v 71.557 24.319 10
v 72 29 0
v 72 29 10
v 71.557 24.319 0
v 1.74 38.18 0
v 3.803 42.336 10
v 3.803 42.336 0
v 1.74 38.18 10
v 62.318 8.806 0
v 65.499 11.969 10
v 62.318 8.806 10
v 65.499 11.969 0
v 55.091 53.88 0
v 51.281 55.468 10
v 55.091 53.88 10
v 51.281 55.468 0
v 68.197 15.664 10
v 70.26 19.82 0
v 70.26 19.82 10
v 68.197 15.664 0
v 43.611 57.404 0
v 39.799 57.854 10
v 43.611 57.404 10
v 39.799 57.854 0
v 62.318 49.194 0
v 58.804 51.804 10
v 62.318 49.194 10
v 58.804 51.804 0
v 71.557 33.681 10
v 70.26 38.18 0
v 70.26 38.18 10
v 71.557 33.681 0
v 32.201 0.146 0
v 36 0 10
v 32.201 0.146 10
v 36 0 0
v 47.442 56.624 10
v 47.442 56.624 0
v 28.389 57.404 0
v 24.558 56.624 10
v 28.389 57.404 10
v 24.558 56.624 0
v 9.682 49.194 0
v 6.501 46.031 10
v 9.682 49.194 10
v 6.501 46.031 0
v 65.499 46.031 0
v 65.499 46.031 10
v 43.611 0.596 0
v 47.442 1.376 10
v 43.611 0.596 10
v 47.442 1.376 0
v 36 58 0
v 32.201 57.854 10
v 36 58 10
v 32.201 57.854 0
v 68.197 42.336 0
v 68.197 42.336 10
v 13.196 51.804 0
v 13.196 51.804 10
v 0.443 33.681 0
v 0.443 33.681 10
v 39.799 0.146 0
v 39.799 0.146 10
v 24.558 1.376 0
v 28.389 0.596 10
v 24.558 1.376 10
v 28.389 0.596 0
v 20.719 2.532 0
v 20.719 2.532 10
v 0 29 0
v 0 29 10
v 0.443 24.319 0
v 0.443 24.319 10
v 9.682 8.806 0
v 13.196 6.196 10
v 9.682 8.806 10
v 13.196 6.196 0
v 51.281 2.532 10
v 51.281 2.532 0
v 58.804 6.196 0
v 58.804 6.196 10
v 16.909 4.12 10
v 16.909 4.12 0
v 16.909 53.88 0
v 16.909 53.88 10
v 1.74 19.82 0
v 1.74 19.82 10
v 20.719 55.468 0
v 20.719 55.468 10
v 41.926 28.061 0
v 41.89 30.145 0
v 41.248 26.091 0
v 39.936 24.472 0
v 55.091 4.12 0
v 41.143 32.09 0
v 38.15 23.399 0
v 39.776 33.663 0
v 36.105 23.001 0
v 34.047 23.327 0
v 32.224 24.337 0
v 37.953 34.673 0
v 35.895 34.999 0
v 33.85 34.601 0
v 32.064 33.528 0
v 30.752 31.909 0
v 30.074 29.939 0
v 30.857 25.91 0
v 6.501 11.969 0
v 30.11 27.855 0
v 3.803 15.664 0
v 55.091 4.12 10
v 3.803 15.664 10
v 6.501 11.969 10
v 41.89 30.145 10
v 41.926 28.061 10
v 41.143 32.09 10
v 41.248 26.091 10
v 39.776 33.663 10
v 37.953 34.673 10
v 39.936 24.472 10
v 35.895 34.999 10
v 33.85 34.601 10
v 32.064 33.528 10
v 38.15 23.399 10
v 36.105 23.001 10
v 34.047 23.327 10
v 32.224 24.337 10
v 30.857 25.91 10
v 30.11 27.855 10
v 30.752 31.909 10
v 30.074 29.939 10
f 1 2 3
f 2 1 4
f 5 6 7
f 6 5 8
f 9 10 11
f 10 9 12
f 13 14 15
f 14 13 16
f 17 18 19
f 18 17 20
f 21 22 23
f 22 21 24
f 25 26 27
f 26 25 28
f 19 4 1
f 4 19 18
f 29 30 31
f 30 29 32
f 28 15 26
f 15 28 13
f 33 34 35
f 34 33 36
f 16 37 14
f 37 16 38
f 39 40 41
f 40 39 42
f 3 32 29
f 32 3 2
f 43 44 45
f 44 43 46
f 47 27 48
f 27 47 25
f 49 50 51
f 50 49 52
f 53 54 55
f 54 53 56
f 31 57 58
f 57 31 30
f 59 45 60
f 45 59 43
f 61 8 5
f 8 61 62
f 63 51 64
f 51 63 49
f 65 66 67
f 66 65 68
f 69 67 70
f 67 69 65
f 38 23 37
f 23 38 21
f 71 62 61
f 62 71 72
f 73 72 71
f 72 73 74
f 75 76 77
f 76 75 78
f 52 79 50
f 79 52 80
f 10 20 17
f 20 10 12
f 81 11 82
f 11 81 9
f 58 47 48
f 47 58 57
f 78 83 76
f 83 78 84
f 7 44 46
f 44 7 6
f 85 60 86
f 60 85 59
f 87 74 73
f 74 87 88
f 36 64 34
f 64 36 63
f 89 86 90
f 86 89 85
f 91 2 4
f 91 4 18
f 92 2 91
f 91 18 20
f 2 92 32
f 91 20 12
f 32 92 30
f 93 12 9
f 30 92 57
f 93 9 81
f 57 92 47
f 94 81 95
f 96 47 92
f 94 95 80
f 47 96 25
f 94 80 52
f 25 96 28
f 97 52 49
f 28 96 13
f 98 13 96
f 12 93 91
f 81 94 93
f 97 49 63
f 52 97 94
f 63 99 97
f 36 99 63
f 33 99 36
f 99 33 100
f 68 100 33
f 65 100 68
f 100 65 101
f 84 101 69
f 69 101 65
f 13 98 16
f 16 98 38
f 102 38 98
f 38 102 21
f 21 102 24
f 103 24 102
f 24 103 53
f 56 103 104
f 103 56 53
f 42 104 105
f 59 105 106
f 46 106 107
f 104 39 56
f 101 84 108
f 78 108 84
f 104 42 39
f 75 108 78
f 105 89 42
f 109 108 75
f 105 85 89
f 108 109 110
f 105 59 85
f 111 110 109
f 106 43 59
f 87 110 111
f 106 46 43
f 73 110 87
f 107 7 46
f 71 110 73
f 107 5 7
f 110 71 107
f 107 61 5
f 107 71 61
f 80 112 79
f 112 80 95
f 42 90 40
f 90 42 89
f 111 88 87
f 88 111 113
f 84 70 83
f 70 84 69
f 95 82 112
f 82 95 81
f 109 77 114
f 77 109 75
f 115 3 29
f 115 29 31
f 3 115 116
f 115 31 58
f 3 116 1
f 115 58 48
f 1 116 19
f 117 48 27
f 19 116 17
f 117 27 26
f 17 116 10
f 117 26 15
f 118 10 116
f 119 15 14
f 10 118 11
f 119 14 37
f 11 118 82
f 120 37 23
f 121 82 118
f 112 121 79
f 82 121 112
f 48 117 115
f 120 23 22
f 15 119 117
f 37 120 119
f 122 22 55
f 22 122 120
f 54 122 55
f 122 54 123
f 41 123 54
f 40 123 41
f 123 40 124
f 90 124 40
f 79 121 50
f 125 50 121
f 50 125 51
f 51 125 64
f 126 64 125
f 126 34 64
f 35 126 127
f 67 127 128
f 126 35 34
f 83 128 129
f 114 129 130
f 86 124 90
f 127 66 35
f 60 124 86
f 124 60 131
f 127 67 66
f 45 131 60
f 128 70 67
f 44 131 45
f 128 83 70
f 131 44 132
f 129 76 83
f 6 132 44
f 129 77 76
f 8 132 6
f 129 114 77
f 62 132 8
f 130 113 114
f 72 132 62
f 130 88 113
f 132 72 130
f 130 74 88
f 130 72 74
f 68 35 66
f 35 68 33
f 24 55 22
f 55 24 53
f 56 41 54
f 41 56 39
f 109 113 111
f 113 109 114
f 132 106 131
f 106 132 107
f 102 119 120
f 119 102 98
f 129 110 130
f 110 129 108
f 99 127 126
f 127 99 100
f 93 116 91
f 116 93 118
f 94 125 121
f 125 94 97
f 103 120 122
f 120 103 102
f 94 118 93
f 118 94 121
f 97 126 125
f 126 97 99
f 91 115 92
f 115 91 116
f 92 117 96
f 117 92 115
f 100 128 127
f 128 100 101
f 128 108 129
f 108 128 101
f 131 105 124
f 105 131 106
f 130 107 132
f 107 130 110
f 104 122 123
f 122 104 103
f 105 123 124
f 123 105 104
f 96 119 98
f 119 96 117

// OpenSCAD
$fn = 32;

// ----------------------------------------------------------------------
// Cam plate: double_lobe cam, base R28
// ----------------------------------------------------------------------

// --- parameters (mm) ---
base_r = 28;              // base circle radius
lobe_h = 8;               // cam lobe rise
bore_r = 6;               // shaft bore radius
plate_t = 10;             // plate thickness, Z (extrusion height)
fit_tol = 0.1;            // declared fit tolerance (prompt contract)
free_tol = 0.5;           // declared free tolerance (prompt contract)

profile = [[72, 29], [71.557, 33.681], [70.26, 38.18], [68.197, 42.336], [65.499, 46.031], [62.318, 49.194], [58.804, 51.804], [55.091, 53.88], [51.281, 55.468], [47.442, 56.624], [43.611, 57.404], [39.799, 57.854], [36, 58], [32.201, 57.854], [28.389, 57.404], [24.558, 56.624], [20.719, 55.468], [16.909, 53.88], [13.196, 51.804], [9.682, 49.194], [6.501, 46.031], [3.803, 42.336], [1.74, 38.18], [0.443, 33.681], [0, 29], [0.443, 24.319], [1.74, 19.82], [3.803, 15.664], [6.501, 11.969], [9.682, 8.806], [13.196, 6.196], [16.909, 4.12], [20.719, 2.532], [24.558, 1.376], [28.389, 0.596], [32.201, 0.146], [36, 0], [39.799, 0.146], [43.611, 0.596], [47.442, 1.376], [51.281, 2.532], [55.091, 4.12], [58.804, 6.196], [62.318, 8.806], [65.499, 11.969], [68.197, 15.664], [70.26, 19.82], [71.557, 24.319]];  // primary outline, 48 points, counter clockwise
void_1 = [[41.89, 30.145], [41.143, 32.09], [39.776, 33.663], [37.953, 34.673], [35.895, 34.999], [33.85, 34.601], [32.064, 33.528], [30.752, 31.909], [30.074, 29.939], [30.11, 27.855], [30.857, 25.91], [32.224, 24.337], [34.047, 23.327], [36.105, 23.001], [38.15, 23.399], [39.936, 24.472], [41.248, 26.091], [41.926, 28.061]];  // shaft bore, 18 points

// --- the one profile operation ---
difference() {
  linear_extrude(height = plate_t) polygon(points = profile);
  translate([0, 0, -1])
    linear_extrude(height = plate_t + 2) polygon(points = void_1);
}
